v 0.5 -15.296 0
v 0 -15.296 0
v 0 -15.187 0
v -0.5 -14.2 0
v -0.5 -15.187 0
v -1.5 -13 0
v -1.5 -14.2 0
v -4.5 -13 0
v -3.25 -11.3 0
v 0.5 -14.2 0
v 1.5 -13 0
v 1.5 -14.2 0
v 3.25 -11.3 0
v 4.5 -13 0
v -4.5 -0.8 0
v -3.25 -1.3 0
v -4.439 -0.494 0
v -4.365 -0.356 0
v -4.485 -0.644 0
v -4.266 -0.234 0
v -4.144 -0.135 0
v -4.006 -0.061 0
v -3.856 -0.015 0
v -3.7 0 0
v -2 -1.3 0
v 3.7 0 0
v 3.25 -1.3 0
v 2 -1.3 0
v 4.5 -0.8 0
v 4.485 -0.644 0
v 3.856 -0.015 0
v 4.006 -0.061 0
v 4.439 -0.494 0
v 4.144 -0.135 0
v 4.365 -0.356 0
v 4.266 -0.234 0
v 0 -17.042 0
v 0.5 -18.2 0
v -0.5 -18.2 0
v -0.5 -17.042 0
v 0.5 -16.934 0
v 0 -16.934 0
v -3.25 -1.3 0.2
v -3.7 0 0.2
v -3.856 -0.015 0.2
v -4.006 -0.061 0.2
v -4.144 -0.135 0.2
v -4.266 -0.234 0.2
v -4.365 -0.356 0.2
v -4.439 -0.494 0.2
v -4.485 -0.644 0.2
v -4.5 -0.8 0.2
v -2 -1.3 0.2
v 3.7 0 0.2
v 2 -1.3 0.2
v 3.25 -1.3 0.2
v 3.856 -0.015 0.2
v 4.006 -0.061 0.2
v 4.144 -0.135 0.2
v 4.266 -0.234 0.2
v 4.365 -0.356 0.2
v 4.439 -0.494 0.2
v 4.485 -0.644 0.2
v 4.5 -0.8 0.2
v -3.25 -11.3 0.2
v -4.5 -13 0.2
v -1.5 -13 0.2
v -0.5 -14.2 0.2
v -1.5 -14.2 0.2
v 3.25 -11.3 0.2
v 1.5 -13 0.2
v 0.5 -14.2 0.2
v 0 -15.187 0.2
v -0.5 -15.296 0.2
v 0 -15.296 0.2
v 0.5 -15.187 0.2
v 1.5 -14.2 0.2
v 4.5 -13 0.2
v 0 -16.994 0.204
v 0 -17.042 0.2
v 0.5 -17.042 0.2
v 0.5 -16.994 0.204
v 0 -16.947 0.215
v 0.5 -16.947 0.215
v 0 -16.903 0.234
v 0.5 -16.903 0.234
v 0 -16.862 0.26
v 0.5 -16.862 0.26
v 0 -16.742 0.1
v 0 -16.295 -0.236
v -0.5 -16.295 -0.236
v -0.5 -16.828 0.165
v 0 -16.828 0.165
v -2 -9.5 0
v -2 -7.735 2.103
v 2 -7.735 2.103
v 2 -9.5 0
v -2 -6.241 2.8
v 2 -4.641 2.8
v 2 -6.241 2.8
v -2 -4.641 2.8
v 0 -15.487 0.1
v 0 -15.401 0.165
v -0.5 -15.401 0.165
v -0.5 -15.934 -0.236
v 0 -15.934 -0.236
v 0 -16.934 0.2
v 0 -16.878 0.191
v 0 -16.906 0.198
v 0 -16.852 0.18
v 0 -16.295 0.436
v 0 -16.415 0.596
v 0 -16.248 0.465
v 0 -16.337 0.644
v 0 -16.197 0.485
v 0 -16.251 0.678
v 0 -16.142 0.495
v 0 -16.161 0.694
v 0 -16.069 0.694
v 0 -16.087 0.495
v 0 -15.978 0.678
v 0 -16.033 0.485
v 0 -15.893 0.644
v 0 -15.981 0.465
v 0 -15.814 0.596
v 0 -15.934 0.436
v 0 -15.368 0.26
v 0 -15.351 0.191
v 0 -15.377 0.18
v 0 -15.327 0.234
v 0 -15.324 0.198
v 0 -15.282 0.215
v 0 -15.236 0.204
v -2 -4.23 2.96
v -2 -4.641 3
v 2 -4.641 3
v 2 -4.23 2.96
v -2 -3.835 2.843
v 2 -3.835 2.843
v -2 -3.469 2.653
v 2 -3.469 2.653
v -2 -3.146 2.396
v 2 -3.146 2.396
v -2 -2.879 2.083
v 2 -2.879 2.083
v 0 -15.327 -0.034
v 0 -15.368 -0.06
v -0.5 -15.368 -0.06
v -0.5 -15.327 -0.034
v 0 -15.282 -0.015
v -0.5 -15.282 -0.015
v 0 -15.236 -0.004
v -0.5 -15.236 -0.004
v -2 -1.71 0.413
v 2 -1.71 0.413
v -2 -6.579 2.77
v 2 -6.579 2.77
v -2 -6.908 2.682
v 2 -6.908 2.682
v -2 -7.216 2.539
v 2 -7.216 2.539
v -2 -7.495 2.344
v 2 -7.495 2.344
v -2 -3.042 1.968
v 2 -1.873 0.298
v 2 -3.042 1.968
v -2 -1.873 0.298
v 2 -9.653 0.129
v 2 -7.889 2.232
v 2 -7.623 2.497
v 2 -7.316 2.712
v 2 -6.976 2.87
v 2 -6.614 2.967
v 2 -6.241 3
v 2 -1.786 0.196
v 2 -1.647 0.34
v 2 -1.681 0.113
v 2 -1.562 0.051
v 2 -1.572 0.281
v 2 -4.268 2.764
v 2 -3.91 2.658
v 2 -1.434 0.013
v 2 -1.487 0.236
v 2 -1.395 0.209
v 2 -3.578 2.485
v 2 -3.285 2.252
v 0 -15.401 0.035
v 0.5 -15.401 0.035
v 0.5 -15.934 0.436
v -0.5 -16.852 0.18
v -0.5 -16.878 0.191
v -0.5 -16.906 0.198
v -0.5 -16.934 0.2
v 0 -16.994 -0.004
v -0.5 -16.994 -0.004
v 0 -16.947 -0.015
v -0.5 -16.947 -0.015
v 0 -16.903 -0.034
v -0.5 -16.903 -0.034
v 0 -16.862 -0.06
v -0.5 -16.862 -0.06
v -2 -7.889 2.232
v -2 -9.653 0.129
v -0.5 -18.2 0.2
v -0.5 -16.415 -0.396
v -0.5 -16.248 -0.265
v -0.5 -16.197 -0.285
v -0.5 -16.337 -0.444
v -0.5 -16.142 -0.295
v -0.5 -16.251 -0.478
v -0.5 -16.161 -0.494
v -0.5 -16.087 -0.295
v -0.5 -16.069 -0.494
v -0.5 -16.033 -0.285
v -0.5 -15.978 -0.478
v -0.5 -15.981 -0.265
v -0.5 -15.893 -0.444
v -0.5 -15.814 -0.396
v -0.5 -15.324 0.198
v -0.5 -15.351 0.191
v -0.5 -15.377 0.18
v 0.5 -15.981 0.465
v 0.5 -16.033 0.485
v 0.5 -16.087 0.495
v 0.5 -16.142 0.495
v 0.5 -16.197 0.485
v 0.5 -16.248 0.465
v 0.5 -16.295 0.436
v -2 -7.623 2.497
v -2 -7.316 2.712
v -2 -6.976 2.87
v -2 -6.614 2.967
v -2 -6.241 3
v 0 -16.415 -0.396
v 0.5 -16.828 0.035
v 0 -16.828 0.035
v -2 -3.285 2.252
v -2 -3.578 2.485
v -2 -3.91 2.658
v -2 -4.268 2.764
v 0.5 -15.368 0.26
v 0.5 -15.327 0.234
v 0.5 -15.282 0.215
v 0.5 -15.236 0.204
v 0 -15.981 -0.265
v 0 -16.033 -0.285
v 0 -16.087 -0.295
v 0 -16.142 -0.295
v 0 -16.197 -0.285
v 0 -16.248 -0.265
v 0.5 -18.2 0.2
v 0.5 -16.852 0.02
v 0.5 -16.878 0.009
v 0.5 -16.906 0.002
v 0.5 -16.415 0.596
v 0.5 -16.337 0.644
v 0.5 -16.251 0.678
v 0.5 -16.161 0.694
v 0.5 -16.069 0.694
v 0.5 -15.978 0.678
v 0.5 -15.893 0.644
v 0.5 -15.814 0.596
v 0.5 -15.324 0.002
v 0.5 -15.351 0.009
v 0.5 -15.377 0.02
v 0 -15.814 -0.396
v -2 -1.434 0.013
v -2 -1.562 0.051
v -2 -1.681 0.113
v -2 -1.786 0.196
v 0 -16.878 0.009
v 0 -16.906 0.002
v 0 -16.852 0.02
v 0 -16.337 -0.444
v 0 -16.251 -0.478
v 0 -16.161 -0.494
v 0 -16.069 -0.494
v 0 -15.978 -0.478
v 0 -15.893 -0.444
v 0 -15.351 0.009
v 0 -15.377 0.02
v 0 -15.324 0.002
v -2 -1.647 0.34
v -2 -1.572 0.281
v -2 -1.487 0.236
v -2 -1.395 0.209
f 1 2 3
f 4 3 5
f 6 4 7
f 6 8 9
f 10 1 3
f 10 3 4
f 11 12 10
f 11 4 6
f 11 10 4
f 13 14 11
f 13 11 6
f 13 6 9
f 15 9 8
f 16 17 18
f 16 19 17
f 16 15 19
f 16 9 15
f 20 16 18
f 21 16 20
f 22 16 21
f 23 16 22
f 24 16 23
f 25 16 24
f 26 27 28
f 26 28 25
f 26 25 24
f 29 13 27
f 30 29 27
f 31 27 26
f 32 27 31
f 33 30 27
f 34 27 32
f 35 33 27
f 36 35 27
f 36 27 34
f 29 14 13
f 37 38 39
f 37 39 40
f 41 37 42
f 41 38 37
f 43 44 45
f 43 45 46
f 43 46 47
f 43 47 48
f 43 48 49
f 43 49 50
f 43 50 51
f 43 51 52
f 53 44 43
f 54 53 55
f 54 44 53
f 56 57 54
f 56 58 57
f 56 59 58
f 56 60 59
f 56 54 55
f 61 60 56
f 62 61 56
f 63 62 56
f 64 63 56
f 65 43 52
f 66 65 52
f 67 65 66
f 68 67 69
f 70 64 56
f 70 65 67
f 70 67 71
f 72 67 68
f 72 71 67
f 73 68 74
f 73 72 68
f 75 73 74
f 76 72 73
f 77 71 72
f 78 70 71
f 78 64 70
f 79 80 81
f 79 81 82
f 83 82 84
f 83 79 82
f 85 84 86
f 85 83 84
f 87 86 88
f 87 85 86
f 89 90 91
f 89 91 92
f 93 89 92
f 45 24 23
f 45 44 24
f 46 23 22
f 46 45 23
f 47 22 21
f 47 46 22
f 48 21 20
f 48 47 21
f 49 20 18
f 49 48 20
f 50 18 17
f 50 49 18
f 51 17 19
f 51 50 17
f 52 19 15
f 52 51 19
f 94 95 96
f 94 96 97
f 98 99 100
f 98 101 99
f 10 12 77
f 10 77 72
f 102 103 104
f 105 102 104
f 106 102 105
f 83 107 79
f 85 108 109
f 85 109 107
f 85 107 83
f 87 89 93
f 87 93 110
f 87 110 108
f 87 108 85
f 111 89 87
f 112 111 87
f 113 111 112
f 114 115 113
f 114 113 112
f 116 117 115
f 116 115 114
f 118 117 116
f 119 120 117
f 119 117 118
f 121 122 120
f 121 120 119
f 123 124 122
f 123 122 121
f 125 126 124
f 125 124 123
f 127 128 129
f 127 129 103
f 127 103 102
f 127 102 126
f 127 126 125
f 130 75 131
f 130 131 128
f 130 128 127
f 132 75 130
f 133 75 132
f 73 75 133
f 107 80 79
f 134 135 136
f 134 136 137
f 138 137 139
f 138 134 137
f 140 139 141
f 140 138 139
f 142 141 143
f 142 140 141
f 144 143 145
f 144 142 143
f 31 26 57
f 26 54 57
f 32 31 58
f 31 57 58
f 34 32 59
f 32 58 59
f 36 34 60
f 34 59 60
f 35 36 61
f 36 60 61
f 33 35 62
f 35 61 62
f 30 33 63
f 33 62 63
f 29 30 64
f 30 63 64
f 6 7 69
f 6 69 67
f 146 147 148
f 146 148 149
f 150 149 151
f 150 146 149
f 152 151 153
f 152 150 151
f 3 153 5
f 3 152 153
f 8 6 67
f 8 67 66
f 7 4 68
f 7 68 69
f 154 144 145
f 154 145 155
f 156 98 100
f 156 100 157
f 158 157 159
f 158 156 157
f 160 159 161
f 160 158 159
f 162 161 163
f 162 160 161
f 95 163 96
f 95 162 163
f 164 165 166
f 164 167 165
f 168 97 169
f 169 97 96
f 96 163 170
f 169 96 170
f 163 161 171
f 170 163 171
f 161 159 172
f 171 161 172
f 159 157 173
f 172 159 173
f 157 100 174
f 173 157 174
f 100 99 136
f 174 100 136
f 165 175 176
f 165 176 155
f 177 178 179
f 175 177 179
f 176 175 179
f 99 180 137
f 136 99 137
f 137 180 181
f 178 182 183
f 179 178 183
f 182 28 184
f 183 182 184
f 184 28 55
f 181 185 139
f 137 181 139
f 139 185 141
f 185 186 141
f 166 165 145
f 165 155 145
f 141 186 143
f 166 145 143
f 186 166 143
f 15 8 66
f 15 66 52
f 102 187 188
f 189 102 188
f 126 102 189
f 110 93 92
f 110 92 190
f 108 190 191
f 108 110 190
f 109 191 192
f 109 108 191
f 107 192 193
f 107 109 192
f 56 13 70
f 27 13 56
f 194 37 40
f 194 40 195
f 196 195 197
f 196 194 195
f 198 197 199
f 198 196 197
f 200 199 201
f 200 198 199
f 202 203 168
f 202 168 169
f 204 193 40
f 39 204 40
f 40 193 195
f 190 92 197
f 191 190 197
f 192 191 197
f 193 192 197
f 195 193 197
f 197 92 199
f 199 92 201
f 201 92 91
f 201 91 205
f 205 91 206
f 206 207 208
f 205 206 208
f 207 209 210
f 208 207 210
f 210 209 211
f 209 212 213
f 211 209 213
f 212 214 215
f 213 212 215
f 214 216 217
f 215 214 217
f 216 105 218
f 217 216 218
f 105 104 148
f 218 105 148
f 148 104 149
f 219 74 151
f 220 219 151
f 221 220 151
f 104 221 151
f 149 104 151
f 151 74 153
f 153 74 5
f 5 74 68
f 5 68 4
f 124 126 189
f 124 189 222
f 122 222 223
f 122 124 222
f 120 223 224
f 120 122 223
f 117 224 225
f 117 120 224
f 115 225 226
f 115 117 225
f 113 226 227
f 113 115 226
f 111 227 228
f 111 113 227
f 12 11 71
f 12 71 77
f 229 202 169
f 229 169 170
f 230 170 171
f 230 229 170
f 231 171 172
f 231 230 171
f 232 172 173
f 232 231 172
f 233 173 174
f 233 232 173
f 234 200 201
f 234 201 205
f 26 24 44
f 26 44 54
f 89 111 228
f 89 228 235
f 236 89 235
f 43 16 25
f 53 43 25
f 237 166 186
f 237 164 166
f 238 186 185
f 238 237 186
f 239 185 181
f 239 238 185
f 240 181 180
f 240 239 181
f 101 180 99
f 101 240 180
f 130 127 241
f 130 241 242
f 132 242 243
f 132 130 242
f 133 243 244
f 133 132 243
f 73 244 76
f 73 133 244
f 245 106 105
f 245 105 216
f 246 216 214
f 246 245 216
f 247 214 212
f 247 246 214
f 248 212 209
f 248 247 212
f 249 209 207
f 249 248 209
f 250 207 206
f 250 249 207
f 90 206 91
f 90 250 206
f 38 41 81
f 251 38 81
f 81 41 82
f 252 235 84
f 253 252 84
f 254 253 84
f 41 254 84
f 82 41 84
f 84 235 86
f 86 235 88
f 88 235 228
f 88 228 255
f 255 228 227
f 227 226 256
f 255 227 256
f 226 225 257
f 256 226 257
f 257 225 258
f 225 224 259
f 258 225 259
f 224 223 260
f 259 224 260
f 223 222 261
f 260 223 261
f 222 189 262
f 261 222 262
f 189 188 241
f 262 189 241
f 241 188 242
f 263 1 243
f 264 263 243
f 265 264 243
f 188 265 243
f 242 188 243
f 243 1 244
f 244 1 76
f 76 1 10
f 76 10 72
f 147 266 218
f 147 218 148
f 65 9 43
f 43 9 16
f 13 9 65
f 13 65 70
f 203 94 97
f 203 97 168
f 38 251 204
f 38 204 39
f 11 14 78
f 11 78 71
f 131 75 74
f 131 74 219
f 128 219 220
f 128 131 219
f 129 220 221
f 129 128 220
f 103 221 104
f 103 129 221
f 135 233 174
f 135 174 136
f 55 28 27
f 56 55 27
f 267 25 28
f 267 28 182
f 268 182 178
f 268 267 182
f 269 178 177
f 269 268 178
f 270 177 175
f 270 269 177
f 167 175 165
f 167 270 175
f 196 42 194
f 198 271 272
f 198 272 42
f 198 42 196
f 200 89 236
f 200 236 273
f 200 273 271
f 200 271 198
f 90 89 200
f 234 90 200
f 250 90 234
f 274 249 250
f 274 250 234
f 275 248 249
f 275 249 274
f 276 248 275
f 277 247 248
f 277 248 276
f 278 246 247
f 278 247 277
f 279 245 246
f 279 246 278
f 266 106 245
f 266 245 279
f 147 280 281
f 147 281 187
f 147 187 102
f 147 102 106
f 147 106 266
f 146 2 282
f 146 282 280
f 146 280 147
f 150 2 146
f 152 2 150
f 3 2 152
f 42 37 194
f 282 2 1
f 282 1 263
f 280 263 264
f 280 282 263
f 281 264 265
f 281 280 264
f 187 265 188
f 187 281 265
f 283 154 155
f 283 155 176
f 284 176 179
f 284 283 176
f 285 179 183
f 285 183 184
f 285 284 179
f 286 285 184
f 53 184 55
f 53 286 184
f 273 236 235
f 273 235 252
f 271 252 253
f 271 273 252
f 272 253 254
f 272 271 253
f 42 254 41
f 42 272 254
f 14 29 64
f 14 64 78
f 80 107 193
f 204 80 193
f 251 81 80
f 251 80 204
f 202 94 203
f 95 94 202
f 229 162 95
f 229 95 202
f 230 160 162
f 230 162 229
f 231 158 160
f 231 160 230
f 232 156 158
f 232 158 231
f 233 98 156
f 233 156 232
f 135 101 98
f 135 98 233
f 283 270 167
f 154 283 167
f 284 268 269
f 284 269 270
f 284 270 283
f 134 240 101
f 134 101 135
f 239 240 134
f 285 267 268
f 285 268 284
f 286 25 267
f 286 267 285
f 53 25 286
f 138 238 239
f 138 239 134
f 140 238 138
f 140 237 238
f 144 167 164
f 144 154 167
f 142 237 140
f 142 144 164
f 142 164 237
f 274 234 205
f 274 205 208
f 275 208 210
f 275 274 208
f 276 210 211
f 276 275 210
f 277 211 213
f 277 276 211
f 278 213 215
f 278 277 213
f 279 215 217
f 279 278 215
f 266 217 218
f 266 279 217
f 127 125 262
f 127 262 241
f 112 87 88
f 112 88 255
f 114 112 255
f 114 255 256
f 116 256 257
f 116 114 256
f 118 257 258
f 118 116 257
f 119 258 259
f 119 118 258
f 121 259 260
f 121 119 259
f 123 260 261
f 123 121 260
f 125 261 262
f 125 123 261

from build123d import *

# Parameters (mm, degrees)
SKETCH1_W           = 6.5
SKETCH1_H           = 10
BOSS_EXTRUDE1_DEPTH = 0.2
BOSS_EXTRUDE2_DEPTH = 2
BOSS_EXTRUDE3_DEPTH = 0.5
FILLET1_R           = 0.8
BOSS_EXTRUDE7_DEPTH = 0.5


with BuildPart() as part:
    # Sketch1 → Boss-Extrude1 (new body)
    with BuildSketch(Plane.XY):
        Polygon((-4.5, 0), (4.5, 0), (4.5, -13), (1.5, -13), (1.5, -14.2), (-1.5, -14.2), (-1.5, -13), (-4.5, -13), align=None)
        with Locations((0, -6.3)):
            Rectangle(SKETCH1_W, SKETCH1_H, mode=Mode.SUBTRACT)
    extrude(amount=BOSS_EXTRUDE1_DEPTH)

    # Sketch2 → Boss-Extrude2 (add, symmetric)
    with BuildSketch(Plane.ZY):
        with BuildLine():
            Line((2.8, -4.64068371), (2.8, -6.24068371))
            ThreePointArc((2.8, -6.24068371), (2.617192211, -7.065276361), (2.103024175, -7.73535319))
            Line((2.103024175, -7.73535319), (0, -9.5))
            Line((0, -9.5), (0.128557522, -9.653208889))
            Line((0.128557522, -9.653208889), (2.231581697, -7.888562079))
            ThreePointArc((2.231581697, -7.888562079), (2.798453768, -7.149800013), (3, -6.24068371))
            Line((3, -6.24068371), (3, -4.64068371))
            ThreePointArc((3, -4.64068371), (2.756943079, -3.647392057), (2.082697913, -2.878562796))
            Line((2.082697913, -2.878562796), (0.413211782, -1.709576022))
            ThreePointArc((0.413211782, -1.709576022), (0.256494583, -1.530874307), (0.2, -1.3))
            Line((0.2, -1.3), (0, -1.3))
            ThreePointArc((0, -1.3), (0.079092417, -1.623224029), (0.298496495, -1.873406431))
            Line((0.298496495, -1.873406431), (1.967982626, -3.042393205))
            ThreePointArc((1.967982626, -3.042393205), (2.579540912, -3.73974178), (2.8, -4.64068371))
        make_face()
    extrude(amount=BOSS_EXTRUDE2_DEPTH, both=True)

    # Sketch4 → Boss-Extrude3 (add)
    with BuildSketch(Plane.ZY):
        with BuildLine():
            Line((0.2, -14.2), (0, -14.2))
            Line((0, -14.2), (0, -15.295761219))
            ThreePointArc((0, -15.295761219), (0.009055652, -15.351444505), (0.035289283, -15.401388772))
            Line((0.035289283, -15.401388772), (0.436234874, -15.93446579))
            ThreePointArc((0.436234874, -15.93446579), (0.496480735, -16.114793139), (0.436234874, -16.295120487))
            Line((0.436234874, -16.295120487), (0.035289283, -16.828197505))
            ThreePointArc((0.035289283, -16.828197505), (0.009055652, -16.878141772), (0, -16.933825058))
            Line((0, -16.933825058), (0, -18.2))
            Line((0, -18.2), (0.2, -18.2))
            Line((0.2, -18.2), (0.2, -17.042162177))
            ThreePointArc((0.2, -17.042162177), (0.215459808, -16.947099676), (0.260245861, -16.861834829))
            Line((0.260245861, -16.861834829), (0.596070967, -16.415338719))
            ThreePointArc((0.596070967, -16.415338719), (0.696480735, -16.114793139), (0.596070967, -15.814247558))
            Line((0.596070967, -15.814247558), (0.260245861, -15.367751448))
            ThreePointArc((0.260245861, -15.367751448), (0.215459808, -15.282486601), (0.2, -15.1874241))
            Line((0.2, -15.1874241), (0.2, -14.2))
        make_face()
    extrude(amount=-BOSS_EXTRUDE3_DEPTH)

    # Fillet1
    fillet1_edges = [part.edges().sort_by_distance(p)[0] for p in [
        (-4.5, 0, 0.1),
        (4.5, 0, 0.1),
    ]]
    fillet(fillet1_edges, radius=FILLET1_R)

    # Sketch7 → Boss-Extrude7 (add)
    with BuildSketch(Plane.ZY):
        with BuildLine():
            Line((0, -14.2), (0.2, -14.2))
            Line((0.2, -14.2), (0.2, -15.295761219))
            ThreePointArc((0.2, -15.295761219), (0.190944348, -15.351444505), (0.164710717, -15.401388772))
            Line((0.164710717, -15.401388772), (-0.236234874, -15.93446579))
            ThreePointArc((-0.236234874, -15.93446579), (-0.296480735, -16.114793139), (-0.236234874, -16.295120487))
            Line((-0.236234874, -16.295120487), (0.164710717, -16.828197505))
            ThreePointArc((0.164710717, -16.828197505), (0.190944348, -16.878141772), (0.2, -16.933825058))
            Line((0.2, -16.933825058), (0.2, -18.2))
            Line((0.2, -18.2), (0, -18.2))
            Line((0, -18.2), (0, -17.042162177))
            ThreePointArc((0, -17.042162177), (-0.015459808, -16.947099676), (-0.060245861, -16.861834829))
            Line((-0.060245861, -16.861834829), (-0.396070967, -16.415338719))
            ThreePointArc((-0.396070967, -16.415338719), (-0.496480735, -16.114793139), (-0.396070967, -15.814247558))
            Line((-0.396070967, -15.814247558), (-0.060245861, -15.367751448))
            ThreePointArc((-0.060245861, -15.367751448), (-0.015459808, -15.282486601), (0, -15.1874241))
            Line((0, -15.1874241), (0, -14.2))
        make_face()
    extrude(amount=BOSS_EXTRUDE7_DEPTH)


solid = part.part
